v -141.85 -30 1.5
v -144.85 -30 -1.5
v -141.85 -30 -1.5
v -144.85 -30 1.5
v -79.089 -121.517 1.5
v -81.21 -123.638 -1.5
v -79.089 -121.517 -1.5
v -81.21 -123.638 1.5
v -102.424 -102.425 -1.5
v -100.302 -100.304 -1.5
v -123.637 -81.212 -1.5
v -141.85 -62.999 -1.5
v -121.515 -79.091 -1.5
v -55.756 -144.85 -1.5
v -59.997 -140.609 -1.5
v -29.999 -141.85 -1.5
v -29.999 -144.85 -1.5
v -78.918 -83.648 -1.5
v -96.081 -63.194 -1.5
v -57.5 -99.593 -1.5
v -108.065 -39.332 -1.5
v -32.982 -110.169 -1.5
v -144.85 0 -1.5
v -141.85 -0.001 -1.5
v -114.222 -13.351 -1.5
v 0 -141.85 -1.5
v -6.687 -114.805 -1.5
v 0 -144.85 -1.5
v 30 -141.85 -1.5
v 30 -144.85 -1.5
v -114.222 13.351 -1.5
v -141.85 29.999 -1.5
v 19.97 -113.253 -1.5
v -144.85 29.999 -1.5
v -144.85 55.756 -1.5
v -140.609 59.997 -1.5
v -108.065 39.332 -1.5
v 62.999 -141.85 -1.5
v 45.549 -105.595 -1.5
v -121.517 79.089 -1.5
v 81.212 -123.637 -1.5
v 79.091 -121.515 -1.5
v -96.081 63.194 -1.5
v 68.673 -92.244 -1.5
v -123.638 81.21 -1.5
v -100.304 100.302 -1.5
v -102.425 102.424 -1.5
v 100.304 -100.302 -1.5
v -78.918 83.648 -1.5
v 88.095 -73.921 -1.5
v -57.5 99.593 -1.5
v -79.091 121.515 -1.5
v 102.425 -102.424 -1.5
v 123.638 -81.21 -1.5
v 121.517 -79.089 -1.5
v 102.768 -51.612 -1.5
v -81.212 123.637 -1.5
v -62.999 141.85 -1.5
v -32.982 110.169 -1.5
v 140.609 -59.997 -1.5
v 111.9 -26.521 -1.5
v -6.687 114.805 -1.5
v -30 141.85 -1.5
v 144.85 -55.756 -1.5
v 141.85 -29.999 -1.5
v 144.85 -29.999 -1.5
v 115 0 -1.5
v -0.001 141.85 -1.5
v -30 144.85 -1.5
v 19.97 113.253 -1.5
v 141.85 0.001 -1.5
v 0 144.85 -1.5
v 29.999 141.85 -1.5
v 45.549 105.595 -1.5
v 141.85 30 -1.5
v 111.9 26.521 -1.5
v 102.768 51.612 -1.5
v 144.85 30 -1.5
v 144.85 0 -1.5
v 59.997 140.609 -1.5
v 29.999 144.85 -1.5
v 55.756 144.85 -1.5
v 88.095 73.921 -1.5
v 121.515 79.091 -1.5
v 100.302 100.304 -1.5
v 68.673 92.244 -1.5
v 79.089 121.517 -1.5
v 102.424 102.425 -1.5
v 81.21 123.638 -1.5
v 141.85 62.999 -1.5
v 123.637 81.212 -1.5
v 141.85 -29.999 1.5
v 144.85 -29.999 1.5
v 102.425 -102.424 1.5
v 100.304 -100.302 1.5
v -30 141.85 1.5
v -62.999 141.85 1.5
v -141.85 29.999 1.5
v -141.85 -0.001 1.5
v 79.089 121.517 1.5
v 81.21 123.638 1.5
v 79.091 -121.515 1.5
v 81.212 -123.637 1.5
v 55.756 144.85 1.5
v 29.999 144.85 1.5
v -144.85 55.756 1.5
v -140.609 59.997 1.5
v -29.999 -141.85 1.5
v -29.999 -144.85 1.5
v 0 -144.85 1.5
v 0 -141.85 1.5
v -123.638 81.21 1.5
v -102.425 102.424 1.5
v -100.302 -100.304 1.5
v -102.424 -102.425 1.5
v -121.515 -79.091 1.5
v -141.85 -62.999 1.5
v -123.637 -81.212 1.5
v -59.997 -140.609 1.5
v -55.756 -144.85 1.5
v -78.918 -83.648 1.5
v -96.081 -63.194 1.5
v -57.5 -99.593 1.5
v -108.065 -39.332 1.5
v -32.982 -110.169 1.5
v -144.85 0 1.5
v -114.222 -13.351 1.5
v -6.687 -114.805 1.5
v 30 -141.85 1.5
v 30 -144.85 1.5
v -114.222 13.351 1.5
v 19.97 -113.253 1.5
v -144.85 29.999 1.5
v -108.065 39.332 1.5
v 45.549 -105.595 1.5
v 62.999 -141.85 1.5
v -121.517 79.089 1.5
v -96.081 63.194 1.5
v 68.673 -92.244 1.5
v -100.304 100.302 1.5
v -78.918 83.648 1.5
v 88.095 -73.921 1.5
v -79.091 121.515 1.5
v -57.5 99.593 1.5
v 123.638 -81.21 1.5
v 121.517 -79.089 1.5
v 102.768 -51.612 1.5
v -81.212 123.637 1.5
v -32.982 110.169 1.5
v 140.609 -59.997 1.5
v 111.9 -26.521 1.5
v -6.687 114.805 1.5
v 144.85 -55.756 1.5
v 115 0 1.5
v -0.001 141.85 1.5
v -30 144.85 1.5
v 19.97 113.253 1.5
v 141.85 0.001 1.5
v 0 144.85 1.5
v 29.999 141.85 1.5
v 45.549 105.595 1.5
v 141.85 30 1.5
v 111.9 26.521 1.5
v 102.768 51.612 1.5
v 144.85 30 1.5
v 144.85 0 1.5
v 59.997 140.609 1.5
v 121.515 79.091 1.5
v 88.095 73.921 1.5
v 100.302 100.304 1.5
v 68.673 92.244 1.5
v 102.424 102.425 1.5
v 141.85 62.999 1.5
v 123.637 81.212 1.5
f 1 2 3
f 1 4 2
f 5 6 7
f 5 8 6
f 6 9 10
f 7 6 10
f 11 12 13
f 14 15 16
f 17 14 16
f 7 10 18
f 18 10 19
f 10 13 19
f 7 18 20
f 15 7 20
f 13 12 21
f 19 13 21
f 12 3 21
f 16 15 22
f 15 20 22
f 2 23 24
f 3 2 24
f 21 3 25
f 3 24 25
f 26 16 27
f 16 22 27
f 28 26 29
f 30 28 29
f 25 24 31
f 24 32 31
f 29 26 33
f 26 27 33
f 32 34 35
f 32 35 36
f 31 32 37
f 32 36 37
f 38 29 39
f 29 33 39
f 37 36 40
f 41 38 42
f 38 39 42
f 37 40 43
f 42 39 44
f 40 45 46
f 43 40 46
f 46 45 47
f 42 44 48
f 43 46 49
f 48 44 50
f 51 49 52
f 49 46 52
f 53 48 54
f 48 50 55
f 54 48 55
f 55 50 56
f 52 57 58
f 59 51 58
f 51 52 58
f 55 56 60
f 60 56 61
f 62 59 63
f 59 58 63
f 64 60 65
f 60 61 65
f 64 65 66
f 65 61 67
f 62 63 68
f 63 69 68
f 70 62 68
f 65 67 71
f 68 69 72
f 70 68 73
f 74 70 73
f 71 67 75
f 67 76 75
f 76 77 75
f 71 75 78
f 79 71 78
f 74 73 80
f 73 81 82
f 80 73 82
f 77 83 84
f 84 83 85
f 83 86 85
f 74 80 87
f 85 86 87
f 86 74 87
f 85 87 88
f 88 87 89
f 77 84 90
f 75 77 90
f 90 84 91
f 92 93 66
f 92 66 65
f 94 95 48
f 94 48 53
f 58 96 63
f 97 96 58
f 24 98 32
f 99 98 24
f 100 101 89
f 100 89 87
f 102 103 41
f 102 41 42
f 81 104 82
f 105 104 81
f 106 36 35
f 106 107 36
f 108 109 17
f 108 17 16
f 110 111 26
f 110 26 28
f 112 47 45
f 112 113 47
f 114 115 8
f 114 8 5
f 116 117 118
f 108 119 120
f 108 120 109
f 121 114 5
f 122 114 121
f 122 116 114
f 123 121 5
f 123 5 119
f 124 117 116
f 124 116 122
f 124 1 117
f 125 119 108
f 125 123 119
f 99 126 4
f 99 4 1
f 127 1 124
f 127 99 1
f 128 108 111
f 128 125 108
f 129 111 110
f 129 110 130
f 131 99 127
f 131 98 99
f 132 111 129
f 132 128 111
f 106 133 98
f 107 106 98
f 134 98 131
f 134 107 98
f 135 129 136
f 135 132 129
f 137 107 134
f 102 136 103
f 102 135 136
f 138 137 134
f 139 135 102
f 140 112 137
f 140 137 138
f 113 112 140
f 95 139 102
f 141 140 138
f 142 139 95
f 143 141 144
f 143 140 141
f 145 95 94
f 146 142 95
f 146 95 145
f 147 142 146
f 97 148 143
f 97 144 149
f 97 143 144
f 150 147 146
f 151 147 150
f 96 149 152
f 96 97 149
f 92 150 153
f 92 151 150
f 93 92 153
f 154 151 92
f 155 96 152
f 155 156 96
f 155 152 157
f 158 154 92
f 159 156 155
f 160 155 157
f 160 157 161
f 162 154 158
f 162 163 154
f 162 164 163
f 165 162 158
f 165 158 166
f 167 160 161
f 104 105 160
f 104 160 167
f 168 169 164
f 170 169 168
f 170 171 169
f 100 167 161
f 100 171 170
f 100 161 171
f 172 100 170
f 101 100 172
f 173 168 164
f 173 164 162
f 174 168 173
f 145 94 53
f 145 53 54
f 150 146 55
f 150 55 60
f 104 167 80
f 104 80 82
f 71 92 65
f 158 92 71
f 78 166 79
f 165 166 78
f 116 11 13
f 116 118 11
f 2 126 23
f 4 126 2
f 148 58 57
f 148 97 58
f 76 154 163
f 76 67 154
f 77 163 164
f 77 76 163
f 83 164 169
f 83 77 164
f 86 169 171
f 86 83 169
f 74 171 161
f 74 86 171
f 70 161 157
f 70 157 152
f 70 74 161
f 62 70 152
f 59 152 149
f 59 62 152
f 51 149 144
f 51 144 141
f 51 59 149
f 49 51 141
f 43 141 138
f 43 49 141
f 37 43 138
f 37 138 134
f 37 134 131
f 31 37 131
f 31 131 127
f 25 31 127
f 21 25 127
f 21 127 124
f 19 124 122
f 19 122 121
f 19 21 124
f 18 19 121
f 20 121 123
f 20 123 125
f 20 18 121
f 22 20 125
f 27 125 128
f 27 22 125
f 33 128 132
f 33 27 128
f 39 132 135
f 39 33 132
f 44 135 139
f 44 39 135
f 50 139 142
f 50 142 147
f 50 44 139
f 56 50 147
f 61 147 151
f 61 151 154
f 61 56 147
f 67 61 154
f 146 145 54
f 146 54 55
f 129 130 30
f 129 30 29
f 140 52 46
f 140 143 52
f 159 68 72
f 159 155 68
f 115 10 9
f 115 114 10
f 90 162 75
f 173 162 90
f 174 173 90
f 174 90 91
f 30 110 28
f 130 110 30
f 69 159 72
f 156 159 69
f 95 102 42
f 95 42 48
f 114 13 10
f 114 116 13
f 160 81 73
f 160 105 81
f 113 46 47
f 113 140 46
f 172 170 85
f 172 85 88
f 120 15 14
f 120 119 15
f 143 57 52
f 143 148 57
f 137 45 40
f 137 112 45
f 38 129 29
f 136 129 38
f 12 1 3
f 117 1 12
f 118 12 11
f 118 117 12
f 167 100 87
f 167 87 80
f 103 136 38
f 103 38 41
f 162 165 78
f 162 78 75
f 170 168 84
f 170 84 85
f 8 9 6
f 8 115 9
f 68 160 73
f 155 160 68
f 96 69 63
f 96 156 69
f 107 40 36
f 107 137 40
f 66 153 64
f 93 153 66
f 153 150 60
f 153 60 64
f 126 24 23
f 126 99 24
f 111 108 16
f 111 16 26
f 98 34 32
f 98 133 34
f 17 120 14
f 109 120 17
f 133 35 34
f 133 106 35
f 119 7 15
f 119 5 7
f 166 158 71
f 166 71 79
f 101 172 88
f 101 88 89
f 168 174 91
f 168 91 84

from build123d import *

# Parameters (mm, degrees)
F0_R     = 115
F1_DEPTH = 1.5


with BuildPart() as f1:
    # F0 (on Top) → F1 (new body, symmetric)
    with BuildSketch(Plane.XY):
        Polygon((-59.9971862603, -140.6090075683), (-55.7561938299, -144.85), (-29.9988345097, -144.85), (-29.9988345097, -141.85), (0, -141.85), (0, -144.85), (30, -144.85), (30, -141.85), (56.9988345097, -141.85), (62.9988345097, -141.85), (81.2120379453, -123.6367965644), (79.0907176018, -121.5154762208), (100.3039210374, -100.3022727852), (102.4252413809, -102.4235931288), (123.6384448165, -81.2103896932), (121.517124473, -79.0890693497), (140.609007565, -59.9971862576), (144.85, -55.7561938226), (144.85, -29.9988345097), (141.85, -29.9988345097), (141.85, 0.0011654903), (144.85, 0), (144.85, 30), (141.85, 30), (141.85, 57), (141.85, 62.9988345097), (123.6367965644, 81.2120379453), (121.5154762208, 79.0907176018), (100.3022727852, 100.3039210374), (102.4235931255, 102.4252413776), (81.2103896932, 123.6384448165), (79.0890693497, 121.517124473), (59.9971862576, 140.609007565), (55.7561938226, 144.85), (29.9988345097, 144.85), (29.9988345097, 141.85), (-0.0011654903, 141.85), (0, 144.85), (-30, 144.85), (-30, 141.85), (-57, 141.85), (-62.9988345097, 141.85), (-81.2120379453, 123.6367965644), (-79.0907176018, 121.5154762208), (-100.3039210374, 100.3022727852), (-102.4252413776, 102.4235931255), (-123.6384448165, 81.2103896932), (-121.5171244733, 79.0890693493), (-140.6090075683, 59.9971862603), (-144.85, 55.7561938286), (-144.85, 29.9988345097), (-141.85, 29.9988345097), (-141.85, -0.0011654903), (-144.85, 0), (-144.85, -30), (-141.85, -30), (-141.85, -57), (-141.85, -62.9988345097), (-123.6367965644, -81.2120379453), (-121.5154762208, -79.0907176018), (-100.3022727852, -100.3039210374), (-102.4235931255, -102.4252413776), (-81.2103896932, -123.6384448165), (-79.0890693493, -121.5171244733), align=None)
        Circle(F0_R, mode=Mode.SUBTRACT)
    extrude(amount=F1_DEPTH, both=True)


solid = f1.part
